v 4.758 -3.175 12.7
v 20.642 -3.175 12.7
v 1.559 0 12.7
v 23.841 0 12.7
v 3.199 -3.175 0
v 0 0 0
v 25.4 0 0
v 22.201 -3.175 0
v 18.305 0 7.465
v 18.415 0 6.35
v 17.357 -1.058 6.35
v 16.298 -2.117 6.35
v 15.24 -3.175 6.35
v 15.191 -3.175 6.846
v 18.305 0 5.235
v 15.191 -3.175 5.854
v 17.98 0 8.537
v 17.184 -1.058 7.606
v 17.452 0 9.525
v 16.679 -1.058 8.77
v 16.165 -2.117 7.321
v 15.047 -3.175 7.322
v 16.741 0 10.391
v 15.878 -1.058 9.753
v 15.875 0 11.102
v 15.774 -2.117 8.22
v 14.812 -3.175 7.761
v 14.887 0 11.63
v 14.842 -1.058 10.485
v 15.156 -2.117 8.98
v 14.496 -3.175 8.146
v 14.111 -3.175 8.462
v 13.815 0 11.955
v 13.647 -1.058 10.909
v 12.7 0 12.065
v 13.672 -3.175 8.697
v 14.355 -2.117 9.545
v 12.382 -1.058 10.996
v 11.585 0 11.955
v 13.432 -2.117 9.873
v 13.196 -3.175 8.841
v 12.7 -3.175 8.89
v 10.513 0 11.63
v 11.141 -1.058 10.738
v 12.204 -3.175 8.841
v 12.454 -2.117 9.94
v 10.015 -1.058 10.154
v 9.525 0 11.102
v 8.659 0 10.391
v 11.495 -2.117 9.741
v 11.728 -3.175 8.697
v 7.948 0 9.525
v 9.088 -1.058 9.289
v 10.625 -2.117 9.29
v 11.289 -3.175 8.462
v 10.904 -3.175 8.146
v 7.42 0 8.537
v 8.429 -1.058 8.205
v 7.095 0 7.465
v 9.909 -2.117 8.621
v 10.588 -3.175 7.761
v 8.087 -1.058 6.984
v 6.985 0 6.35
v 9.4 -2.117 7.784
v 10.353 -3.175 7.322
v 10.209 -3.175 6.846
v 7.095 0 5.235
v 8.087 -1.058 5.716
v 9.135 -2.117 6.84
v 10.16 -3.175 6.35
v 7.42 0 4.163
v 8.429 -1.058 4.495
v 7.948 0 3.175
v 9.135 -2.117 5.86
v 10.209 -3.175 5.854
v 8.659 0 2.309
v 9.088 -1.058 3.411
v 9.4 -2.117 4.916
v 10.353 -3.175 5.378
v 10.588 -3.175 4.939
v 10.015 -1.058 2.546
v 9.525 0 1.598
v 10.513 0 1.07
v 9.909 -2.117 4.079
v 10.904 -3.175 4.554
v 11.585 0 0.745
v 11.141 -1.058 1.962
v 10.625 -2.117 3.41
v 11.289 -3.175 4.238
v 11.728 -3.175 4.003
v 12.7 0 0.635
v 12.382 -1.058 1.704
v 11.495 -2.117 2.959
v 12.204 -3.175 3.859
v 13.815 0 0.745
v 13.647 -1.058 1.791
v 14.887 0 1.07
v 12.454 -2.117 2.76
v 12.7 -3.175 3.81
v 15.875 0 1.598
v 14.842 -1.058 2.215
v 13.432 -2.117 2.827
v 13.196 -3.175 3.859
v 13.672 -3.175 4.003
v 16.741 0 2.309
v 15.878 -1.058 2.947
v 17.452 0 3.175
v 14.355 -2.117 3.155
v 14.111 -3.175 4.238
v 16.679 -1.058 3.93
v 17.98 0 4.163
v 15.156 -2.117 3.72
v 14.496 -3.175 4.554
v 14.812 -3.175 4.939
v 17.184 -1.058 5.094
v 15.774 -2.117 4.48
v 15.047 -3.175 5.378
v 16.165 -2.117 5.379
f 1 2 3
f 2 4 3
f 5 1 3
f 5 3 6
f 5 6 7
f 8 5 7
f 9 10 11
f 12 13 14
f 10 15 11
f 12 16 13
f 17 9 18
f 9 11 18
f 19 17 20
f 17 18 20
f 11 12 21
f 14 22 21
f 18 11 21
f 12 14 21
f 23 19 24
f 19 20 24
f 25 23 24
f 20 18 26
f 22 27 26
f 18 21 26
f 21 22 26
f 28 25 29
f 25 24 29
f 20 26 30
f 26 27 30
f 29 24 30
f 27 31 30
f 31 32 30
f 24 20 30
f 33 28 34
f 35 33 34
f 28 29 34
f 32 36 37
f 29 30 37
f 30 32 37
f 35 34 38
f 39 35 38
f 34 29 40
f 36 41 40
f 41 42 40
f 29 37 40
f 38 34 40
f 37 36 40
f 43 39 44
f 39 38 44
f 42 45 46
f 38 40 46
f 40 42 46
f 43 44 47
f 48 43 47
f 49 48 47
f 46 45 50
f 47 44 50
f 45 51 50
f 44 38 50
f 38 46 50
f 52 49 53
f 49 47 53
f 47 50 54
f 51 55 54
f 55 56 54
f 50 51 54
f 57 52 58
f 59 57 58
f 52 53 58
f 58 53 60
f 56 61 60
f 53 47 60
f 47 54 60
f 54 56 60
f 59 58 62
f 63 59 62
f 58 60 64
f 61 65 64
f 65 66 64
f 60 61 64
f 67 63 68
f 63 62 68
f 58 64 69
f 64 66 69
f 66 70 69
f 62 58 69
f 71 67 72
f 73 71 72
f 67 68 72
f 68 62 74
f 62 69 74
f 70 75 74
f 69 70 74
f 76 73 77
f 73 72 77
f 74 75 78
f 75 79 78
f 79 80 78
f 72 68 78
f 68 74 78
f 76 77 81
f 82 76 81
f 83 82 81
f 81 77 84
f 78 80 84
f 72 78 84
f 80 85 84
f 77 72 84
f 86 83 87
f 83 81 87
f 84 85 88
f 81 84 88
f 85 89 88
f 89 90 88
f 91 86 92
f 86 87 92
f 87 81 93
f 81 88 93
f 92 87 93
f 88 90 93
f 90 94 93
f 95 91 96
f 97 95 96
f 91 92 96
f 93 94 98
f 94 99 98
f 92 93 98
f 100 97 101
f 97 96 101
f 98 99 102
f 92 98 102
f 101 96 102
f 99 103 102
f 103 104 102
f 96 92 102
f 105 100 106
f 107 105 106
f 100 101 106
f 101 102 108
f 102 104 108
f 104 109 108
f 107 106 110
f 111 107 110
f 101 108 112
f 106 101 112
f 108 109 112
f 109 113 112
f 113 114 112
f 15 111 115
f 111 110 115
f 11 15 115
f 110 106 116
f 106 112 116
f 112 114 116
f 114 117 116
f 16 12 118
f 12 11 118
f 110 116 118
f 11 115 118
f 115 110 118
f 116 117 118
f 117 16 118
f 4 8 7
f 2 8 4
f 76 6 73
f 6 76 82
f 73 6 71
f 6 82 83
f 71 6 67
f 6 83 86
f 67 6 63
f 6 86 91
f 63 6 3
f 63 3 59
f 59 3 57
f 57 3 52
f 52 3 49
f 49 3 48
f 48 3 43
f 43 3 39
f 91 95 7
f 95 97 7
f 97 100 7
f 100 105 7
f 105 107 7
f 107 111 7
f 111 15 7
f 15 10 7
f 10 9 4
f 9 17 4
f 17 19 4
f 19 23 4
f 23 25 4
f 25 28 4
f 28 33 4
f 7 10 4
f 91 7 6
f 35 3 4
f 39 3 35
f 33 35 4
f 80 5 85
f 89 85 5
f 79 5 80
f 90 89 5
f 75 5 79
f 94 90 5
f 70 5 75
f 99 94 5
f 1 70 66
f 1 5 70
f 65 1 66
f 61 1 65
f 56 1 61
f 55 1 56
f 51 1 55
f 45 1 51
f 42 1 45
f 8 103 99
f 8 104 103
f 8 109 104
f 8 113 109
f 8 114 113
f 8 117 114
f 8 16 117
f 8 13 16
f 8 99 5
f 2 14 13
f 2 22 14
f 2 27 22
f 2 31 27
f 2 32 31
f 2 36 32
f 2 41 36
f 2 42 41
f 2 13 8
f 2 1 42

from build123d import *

# Parameters (mm, degrees)
F1_DEPTH = 3.175
F2_SIZE  = 3.17499
F3_R     = 2.54
F4_DEPTH = 25.4
F5_SIZE  = 3.17499


# Not quite as in the source:
# - a fillet or chamfer is up to 0.001 mm smaller than in the source, because OpenCascade refuses the exact size


with BuildPart() as f1:
    # F0 (on Front) → F1 (new body)
    with BuildSketch(Plane.XZ):
        Polygon((1.5593639235, 12.7), (0, 0), (25.4, 0), (23.8406360765, 12.7), align=None)
    extrude(amount=F1_DEPTH)

    # F2 (size 3.175 in the source; OpenCascade refuses exactly that, so slightly less here)
    f2_edges = [f1.edges().sort_by_distance(p)[0] for p in [
        (24.620318, -3.175, 6.35),
        (0.779682, -3.175, 6.35),
    ]]
    chamfer(f2_edges, length=F2_SIZE)

    # F3 (on face) → F4 (cut)
    with BuildSketch(Plane.XZ.offset(3.175)):
        with Locations((12.7, 6.35)):
            Circle(F3_R)
    extrude(amount=-F4_DEPTH, mode=Mode.SUBTRACT)

    # F5 (size 3.175 in the source; OpenCascade refuses exactly that, so slightly less here)
    f5_edges = [f1.edges().sort_by_distance(p)[0] for p in [
        (10.16, 0, 6.35),
    ]]
    chamfer(f5_edges, length=F5_SIZE)


solid = f1.part
